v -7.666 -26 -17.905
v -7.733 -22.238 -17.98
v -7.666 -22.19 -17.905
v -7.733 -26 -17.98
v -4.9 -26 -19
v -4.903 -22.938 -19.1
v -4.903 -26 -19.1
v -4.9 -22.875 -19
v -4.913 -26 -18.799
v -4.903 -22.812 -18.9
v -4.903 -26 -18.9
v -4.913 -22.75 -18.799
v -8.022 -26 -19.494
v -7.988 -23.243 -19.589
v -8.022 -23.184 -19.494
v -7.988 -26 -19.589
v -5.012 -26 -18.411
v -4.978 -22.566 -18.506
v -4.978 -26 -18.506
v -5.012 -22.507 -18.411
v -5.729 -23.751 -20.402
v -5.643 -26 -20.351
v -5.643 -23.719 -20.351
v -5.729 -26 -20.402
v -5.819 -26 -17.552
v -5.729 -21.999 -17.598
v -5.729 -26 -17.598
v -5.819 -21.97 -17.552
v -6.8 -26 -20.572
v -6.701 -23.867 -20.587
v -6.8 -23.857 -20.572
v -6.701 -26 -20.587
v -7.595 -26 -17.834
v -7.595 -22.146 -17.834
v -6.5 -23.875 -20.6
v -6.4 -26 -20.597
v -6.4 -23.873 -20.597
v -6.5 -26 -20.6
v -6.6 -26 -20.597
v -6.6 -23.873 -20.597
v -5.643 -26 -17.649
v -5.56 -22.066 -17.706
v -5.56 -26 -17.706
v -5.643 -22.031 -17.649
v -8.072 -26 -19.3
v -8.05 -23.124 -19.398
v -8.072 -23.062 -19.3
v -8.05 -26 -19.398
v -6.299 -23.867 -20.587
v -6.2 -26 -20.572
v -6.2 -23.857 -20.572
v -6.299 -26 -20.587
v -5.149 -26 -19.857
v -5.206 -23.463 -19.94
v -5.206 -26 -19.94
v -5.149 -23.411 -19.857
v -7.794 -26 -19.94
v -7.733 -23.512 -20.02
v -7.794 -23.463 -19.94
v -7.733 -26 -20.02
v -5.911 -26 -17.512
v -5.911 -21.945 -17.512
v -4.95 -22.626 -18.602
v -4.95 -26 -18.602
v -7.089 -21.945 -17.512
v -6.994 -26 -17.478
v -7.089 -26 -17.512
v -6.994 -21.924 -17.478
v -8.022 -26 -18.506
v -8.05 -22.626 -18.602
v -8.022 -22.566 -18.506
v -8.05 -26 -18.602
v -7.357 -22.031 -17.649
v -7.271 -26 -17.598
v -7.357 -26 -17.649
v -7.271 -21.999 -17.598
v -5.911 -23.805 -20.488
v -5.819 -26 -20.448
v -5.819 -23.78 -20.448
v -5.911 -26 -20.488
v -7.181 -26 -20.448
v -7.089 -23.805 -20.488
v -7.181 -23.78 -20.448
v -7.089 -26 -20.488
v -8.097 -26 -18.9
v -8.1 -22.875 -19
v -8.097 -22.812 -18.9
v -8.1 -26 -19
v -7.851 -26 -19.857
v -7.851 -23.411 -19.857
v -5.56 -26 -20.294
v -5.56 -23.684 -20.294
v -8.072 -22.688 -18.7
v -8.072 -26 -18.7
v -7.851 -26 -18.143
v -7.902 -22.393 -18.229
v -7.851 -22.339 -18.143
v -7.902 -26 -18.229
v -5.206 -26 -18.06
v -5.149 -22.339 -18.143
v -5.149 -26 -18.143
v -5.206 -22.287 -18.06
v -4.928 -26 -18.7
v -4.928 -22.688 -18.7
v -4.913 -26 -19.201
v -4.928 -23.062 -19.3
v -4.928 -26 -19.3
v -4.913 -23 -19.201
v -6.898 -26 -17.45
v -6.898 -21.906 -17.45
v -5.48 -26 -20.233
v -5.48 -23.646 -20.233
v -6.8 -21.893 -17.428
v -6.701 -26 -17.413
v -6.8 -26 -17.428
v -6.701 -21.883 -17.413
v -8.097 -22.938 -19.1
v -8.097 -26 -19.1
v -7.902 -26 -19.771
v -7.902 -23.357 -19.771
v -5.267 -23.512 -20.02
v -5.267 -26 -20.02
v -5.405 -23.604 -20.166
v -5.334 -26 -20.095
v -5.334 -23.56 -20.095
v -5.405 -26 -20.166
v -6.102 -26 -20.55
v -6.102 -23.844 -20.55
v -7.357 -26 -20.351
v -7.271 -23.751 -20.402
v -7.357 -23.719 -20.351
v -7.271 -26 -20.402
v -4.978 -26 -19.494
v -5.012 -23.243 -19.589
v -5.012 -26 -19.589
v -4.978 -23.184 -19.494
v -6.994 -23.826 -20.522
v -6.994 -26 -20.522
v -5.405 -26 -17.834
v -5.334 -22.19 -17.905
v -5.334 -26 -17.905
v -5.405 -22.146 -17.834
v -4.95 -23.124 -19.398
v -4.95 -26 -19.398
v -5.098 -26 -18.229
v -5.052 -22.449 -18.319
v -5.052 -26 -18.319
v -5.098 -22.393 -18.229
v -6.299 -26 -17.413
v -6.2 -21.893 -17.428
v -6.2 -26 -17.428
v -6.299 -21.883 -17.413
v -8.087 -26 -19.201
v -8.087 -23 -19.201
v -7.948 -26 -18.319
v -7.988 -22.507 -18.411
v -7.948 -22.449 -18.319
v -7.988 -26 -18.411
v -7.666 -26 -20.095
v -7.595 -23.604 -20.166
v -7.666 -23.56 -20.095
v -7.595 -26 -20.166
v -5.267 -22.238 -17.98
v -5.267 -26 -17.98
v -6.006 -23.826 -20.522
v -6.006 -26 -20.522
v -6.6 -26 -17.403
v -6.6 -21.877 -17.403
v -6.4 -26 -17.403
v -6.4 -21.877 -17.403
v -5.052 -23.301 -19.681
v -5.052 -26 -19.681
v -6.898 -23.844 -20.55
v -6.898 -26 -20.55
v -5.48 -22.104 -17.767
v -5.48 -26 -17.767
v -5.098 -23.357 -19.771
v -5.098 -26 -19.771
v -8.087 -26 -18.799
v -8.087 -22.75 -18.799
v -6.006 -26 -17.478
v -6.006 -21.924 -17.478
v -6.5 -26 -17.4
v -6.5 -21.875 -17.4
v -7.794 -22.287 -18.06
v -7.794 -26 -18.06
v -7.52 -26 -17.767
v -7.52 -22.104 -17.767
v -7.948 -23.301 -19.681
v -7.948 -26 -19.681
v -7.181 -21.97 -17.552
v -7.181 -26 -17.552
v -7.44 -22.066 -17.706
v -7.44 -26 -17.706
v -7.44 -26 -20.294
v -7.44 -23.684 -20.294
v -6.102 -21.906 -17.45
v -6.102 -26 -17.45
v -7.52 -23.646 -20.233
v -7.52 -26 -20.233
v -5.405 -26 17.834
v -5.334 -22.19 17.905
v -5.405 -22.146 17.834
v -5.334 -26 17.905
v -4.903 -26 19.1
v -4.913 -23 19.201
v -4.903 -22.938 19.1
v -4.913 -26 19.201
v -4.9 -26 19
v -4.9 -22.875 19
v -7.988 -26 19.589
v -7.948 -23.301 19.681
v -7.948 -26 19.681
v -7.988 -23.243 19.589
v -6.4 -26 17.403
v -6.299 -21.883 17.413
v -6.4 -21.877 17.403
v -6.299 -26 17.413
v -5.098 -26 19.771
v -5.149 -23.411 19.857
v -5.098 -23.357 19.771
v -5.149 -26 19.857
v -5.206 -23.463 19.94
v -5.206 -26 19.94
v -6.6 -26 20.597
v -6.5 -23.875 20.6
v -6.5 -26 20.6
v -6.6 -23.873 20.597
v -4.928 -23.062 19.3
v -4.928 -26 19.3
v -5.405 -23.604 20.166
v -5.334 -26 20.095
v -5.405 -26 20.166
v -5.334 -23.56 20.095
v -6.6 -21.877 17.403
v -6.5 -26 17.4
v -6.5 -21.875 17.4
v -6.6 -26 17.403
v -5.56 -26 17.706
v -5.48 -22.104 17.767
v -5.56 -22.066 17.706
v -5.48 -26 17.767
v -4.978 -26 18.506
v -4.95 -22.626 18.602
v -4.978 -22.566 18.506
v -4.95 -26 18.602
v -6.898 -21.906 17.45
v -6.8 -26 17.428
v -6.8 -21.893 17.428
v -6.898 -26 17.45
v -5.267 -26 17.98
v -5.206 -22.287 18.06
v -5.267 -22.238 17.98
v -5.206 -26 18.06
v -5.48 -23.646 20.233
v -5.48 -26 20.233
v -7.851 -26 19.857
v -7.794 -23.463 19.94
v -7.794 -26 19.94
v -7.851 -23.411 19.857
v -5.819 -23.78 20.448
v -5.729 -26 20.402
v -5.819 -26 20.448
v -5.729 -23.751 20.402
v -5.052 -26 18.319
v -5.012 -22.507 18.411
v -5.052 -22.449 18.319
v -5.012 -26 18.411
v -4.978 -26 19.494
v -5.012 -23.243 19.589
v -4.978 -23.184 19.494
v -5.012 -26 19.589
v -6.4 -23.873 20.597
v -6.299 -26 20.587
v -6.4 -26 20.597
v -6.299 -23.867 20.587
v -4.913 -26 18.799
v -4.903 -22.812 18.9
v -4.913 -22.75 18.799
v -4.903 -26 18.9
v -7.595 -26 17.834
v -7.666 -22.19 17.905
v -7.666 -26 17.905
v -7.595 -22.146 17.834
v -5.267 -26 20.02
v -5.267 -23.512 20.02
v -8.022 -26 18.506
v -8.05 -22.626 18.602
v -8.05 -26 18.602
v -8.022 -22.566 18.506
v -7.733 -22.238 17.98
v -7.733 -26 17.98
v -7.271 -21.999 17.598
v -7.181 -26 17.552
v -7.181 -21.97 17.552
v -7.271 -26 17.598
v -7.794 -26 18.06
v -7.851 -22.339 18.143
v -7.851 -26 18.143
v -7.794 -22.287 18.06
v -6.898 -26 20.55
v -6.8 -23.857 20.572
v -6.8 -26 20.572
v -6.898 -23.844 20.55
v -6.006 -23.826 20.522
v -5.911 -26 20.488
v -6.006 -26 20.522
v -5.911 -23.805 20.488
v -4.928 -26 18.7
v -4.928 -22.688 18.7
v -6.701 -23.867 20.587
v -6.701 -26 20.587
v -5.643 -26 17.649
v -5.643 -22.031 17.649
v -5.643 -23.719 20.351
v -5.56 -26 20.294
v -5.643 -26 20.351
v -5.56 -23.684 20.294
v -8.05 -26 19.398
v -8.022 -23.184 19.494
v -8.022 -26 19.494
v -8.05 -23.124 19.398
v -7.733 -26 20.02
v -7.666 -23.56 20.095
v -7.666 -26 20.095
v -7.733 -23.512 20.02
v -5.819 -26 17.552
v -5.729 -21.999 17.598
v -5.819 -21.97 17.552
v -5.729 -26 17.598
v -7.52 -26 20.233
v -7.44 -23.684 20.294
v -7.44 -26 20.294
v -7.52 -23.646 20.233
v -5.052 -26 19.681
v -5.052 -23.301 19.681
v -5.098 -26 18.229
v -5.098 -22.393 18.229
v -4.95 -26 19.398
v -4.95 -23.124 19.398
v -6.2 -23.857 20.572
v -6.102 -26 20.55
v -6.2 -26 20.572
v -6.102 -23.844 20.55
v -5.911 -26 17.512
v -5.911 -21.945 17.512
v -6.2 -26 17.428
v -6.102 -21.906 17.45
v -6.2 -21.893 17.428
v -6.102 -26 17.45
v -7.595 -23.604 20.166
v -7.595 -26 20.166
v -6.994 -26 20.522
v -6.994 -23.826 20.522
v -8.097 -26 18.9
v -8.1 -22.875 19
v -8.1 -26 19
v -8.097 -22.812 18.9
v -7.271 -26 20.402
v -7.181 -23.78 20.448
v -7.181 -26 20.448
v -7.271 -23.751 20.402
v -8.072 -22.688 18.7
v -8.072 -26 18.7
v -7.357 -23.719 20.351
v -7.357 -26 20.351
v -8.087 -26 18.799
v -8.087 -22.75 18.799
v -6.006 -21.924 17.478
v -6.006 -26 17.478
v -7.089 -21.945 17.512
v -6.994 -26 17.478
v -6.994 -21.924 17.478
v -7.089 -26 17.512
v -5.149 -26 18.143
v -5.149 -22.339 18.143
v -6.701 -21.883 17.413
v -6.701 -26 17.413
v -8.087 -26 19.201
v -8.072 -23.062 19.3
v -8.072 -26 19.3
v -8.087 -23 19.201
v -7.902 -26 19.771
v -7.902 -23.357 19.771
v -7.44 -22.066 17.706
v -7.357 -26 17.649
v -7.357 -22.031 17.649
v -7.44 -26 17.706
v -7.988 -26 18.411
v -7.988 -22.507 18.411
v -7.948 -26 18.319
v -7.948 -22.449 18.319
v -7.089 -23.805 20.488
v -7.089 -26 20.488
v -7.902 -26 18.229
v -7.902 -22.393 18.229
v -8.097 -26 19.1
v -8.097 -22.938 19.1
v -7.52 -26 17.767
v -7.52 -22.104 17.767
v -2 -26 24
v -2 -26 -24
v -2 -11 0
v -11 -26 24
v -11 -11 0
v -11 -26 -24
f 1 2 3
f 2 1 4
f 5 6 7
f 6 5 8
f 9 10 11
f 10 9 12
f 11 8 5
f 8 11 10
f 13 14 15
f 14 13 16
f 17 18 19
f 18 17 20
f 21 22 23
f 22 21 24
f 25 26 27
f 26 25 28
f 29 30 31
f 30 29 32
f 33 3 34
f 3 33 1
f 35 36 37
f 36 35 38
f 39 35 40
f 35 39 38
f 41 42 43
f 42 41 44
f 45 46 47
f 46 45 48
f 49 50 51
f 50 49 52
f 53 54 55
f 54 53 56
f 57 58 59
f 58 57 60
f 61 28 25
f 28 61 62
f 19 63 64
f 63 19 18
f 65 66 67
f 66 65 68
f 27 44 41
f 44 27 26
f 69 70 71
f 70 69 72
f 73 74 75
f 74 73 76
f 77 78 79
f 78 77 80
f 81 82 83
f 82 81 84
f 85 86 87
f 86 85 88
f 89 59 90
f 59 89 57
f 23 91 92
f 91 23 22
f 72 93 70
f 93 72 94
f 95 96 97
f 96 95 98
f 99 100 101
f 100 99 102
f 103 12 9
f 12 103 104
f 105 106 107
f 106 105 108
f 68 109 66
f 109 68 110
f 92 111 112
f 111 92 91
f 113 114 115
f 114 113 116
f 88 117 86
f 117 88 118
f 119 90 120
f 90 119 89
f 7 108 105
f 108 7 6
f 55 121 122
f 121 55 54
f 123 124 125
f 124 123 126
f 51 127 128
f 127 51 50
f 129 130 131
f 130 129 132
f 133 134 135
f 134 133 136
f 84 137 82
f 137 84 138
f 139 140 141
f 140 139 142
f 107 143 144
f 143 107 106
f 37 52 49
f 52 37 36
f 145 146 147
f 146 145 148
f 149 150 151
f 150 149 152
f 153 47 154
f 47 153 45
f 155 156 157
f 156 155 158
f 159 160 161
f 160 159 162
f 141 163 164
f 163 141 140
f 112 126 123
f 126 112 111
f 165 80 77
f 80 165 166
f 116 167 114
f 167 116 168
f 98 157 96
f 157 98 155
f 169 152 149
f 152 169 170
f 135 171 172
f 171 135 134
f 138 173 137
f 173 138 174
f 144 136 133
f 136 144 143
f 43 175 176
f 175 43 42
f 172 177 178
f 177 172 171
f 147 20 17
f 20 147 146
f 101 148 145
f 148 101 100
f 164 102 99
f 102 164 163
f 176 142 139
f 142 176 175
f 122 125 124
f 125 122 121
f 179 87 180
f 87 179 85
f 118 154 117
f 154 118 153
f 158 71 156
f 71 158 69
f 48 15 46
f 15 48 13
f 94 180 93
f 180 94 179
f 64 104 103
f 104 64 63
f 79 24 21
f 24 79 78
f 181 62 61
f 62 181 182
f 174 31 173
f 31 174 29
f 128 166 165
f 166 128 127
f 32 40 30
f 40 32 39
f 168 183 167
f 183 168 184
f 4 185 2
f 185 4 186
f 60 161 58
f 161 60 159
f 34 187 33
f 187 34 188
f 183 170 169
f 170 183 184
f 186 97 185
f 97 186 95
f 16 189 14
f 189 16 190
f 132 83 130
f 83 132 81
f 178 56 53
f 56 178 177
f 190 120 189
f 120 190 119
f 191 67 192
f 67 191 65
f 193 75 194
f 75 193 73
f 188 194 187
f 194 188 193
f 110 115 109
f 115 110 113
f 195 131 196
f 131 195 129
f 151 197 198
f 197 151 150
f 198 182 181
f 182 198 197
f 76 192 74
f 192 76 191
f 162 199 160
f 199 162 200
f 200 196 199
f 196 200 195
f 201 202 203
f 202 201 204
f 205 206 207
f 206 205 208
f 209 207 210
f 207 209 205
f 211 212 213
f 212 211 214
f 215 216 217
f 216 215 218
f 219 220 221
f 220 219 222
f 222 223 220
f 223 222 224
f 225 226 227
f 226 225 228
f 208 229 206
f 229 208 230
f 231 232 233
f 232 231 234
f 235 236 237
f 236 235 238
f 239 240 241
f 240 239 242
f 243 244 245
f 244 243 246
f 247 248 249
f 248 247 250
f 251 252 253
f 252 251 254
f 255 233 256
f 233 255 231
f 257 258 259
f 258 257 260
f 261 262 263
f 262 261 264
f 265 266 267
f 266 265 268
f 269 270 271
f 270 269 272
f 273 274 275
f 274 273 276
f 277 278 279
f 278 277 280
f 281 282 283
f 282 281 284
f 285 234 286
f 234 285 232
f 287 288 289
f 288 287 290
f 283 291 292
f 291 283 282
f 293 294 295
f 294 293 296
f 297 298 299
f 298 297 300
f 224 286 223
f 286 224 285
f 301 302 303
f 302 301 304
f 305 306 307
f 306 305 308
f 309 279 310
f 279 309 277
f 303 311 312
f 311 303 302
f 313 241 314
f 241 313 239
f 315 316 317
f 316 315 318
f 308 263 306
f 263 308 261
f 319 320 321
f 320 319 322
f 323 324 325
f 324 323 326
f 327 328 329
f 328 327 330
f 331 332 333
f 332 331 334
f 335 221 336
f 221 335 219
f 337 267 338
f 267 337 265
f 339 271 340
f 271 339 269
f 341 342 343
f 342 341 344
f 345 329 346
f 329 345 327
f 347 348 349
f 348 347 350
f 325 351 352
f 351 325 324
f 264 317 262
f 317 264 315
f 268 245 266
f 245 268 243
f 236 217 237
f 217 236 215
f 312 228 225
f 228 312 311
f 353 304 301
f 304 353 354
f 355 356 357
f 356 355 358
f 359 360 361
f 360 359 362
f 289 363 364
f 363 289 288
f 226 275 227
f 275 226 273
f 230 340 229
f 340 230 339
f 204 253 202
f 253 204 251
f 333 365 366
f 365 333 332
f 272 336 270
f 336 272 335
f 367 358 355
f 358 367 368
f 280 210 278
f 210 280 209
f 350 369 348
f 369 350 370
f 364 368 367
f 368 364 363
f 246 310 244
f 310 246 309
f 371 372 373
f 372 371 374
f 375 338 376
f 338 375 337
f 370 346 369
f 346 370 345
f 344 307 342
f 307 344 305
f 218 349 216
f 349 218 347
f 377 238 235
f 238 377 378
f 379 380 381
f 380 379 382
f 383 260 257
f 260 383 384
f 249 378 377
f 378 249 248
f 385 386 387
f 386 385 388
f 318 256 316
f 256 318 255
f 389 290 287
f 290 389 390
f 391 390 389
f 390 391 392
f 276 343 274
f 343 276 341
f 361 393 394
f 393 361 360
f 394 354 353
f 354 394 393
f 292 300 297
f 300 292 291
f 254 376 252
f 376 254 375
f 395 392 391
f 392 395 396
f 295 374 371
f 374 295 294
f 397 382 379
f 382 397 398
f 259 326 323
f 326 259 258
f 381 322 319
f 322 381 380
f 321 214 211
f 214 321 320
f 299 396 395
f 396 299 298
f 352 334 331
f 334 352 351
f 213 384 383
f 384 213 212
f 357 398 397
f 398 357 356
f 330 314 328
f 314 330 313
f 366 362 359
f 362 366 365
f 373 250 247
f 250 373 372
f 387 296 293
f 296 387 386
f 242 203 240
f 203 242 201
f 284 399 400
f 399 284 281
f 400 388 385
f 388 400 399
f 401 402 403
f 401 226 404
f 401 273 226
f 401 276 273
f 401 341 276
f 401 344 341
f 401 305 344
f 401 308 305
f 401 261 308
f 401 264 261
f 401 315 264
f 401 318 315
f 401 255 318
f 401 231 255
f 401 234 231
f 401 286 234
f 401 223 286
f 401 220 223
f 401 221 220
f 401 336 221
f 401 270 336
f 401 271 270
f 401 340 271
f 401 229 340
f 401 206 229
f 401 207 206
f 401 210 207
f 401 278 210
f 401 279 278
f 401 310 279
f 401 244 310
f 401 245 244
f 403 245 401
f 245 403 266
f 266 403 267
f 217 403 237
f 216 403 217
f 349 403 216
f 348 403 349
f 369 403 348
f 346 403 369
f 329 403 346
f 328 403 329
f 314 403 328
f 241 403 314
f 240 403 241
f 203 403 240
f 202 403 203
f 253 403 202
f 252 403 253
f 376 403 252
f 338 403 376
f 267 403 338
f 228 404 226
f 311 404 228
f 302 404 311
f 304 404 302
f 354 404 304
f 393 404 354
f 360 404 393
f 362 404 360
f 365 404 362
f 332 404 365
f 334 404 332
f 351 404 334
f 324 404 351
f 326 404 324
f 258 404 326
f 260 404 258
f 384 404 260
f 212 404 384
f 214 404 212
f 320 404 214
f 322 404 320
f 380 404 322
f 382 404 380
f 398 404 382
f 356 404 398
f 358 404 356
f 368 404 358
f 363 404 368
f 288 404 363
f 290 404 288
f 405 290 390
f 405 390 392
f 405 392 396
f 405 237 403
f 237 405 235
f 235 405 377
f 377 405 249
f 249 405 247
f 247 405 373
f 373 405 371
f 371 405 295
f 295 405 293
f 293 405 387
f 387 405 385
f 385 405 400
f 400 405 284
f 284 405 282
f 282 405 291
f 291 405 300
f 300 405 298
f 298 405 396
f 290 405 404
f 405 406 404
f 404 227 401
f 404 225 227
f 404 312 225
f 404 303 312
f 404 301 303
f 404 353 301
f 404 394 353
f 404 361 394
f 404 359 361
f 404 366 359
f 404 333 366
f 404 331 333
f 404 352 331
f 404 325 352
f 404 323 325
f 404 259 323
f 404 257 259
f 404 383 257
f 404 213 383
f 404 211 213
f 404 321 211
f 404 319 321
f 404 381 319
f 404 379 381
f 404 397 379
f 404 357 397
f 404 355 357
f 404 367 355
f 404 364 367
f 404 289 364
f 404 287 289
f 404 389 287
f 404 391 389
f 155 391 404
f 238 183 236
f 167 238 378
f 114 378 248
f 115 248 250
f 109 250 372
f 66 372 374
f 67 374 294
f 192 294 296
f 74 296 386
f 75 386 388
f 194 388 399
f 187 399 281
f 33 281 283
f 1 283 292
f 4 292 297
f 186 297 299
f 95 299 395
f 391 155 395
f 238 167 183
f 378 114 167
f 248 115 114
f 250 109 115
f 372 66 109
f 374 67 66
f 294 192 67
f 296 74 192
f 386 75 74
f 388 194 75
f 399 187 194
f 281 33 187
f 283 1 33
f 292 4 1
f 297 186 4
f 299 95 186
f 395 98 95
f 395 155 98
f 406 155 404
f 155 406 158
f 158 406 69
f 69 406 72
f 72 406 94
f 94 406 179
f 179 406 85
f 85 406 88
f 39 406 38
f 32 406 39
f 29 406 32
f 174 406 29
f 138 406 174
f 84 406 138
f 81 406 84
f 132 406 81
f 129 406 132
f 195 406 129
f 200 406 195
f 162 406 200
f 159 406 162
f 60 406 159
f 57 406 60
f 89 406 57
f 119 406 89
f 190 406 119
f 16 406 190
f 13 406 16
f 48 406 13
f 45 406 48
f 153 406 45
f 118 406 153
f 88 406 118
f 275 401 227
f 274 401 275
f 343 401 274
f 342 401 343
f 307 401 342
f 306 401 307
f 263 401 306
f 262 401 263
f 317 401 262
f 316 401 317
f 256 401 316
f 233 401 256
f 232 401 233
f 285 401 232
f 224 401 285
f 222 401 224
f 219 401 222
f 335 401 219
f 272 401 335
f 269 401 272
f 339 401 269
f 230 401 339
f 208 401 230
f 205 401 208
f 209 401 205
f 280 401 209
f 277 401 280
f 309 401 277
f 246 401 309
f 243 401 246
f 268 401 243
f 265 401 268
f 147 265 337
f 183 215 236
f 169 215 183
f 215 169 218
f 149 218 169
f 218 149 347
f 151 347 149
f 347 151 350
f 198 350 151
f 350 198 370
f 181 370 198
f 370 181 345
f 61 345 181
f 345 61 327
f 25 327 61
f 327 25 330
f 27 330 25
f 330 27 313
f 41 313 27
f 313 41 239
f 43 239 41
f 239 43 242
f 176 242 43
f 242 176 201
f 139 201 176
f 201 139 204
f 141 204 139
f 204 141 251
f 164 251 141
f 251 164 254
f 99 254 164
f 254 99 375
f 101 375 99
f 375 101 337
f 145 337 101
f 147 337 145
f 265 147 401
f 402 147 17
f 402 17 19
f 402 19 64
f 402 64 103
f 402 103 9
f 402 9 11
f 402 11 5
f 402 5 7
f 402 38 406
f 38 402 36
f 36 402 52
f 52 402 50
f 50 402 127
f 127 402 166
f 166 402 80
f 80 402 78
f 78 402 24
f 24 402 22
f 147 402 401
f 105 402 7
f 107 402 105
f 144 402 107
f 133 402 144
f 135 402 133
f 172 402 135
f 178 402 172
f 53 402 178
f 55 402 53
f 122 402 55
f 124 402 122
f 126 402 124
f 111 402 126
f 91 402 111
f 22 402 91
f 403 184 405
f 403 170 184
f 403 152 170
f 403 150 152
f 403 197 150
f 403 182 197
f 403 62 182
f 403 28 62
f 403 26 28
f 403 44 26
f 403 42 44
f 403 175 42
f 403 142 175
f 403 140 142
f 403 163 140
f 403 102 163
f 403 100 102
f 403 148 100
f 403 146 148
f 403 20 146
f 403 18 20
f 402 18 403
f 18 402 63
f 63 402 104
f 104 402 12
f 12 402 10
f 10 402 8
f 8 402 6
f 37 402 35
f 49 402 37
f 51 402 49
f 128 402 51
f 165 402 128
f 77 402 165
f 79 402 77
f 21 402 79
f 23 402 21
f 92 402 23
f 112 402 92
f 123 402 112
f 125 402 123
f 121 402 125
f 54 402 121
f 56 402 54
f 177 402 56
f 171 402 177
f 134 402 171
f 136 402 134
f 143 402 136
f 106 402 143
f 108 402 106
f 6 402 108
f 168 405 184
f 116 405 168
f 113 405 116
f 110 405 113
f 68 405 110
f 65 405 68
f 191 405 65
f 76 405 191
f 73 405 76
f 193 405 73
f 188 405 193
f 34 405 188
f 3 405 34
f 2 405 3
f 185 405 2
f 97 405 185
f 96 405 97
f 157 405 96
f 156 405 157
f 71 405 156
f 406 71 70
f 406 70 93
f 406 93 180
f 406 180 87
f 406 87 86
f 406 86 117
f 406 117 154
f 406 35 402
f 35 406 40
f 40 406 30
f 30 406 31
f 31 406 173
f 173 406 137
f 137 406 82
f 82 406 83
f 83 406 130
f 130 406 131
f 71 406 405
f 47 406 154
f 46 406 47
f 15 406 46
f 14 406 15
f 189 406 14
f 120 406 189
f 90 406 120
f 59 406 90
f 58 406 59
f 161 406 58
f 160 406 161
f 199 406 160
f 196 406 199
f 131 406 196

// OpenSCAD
difference(){
	union(){

        translate([3-5,-26,-24]){
            rotate([0,-90,0]){
                linear_extrude(height = 14-5)
                    polygon(points=[
                        [0,0],
                        [48,0],
                        [24,15]
                    ]);
            }            
        }


        


	}
	union() {
       
        translate([-6.5,8.5,-19]){
            rotate([90,0,0]){
                cylinder(h=125, r=3.2/2, $fn=100, center=false);
            }
        }         
        translate([-6.5,8.5,19]){
            rotate([90,0,0]){
                cylinder(h=125, r=3.2/2, $fn=100, center=false);
            }
        }         



	}
}
